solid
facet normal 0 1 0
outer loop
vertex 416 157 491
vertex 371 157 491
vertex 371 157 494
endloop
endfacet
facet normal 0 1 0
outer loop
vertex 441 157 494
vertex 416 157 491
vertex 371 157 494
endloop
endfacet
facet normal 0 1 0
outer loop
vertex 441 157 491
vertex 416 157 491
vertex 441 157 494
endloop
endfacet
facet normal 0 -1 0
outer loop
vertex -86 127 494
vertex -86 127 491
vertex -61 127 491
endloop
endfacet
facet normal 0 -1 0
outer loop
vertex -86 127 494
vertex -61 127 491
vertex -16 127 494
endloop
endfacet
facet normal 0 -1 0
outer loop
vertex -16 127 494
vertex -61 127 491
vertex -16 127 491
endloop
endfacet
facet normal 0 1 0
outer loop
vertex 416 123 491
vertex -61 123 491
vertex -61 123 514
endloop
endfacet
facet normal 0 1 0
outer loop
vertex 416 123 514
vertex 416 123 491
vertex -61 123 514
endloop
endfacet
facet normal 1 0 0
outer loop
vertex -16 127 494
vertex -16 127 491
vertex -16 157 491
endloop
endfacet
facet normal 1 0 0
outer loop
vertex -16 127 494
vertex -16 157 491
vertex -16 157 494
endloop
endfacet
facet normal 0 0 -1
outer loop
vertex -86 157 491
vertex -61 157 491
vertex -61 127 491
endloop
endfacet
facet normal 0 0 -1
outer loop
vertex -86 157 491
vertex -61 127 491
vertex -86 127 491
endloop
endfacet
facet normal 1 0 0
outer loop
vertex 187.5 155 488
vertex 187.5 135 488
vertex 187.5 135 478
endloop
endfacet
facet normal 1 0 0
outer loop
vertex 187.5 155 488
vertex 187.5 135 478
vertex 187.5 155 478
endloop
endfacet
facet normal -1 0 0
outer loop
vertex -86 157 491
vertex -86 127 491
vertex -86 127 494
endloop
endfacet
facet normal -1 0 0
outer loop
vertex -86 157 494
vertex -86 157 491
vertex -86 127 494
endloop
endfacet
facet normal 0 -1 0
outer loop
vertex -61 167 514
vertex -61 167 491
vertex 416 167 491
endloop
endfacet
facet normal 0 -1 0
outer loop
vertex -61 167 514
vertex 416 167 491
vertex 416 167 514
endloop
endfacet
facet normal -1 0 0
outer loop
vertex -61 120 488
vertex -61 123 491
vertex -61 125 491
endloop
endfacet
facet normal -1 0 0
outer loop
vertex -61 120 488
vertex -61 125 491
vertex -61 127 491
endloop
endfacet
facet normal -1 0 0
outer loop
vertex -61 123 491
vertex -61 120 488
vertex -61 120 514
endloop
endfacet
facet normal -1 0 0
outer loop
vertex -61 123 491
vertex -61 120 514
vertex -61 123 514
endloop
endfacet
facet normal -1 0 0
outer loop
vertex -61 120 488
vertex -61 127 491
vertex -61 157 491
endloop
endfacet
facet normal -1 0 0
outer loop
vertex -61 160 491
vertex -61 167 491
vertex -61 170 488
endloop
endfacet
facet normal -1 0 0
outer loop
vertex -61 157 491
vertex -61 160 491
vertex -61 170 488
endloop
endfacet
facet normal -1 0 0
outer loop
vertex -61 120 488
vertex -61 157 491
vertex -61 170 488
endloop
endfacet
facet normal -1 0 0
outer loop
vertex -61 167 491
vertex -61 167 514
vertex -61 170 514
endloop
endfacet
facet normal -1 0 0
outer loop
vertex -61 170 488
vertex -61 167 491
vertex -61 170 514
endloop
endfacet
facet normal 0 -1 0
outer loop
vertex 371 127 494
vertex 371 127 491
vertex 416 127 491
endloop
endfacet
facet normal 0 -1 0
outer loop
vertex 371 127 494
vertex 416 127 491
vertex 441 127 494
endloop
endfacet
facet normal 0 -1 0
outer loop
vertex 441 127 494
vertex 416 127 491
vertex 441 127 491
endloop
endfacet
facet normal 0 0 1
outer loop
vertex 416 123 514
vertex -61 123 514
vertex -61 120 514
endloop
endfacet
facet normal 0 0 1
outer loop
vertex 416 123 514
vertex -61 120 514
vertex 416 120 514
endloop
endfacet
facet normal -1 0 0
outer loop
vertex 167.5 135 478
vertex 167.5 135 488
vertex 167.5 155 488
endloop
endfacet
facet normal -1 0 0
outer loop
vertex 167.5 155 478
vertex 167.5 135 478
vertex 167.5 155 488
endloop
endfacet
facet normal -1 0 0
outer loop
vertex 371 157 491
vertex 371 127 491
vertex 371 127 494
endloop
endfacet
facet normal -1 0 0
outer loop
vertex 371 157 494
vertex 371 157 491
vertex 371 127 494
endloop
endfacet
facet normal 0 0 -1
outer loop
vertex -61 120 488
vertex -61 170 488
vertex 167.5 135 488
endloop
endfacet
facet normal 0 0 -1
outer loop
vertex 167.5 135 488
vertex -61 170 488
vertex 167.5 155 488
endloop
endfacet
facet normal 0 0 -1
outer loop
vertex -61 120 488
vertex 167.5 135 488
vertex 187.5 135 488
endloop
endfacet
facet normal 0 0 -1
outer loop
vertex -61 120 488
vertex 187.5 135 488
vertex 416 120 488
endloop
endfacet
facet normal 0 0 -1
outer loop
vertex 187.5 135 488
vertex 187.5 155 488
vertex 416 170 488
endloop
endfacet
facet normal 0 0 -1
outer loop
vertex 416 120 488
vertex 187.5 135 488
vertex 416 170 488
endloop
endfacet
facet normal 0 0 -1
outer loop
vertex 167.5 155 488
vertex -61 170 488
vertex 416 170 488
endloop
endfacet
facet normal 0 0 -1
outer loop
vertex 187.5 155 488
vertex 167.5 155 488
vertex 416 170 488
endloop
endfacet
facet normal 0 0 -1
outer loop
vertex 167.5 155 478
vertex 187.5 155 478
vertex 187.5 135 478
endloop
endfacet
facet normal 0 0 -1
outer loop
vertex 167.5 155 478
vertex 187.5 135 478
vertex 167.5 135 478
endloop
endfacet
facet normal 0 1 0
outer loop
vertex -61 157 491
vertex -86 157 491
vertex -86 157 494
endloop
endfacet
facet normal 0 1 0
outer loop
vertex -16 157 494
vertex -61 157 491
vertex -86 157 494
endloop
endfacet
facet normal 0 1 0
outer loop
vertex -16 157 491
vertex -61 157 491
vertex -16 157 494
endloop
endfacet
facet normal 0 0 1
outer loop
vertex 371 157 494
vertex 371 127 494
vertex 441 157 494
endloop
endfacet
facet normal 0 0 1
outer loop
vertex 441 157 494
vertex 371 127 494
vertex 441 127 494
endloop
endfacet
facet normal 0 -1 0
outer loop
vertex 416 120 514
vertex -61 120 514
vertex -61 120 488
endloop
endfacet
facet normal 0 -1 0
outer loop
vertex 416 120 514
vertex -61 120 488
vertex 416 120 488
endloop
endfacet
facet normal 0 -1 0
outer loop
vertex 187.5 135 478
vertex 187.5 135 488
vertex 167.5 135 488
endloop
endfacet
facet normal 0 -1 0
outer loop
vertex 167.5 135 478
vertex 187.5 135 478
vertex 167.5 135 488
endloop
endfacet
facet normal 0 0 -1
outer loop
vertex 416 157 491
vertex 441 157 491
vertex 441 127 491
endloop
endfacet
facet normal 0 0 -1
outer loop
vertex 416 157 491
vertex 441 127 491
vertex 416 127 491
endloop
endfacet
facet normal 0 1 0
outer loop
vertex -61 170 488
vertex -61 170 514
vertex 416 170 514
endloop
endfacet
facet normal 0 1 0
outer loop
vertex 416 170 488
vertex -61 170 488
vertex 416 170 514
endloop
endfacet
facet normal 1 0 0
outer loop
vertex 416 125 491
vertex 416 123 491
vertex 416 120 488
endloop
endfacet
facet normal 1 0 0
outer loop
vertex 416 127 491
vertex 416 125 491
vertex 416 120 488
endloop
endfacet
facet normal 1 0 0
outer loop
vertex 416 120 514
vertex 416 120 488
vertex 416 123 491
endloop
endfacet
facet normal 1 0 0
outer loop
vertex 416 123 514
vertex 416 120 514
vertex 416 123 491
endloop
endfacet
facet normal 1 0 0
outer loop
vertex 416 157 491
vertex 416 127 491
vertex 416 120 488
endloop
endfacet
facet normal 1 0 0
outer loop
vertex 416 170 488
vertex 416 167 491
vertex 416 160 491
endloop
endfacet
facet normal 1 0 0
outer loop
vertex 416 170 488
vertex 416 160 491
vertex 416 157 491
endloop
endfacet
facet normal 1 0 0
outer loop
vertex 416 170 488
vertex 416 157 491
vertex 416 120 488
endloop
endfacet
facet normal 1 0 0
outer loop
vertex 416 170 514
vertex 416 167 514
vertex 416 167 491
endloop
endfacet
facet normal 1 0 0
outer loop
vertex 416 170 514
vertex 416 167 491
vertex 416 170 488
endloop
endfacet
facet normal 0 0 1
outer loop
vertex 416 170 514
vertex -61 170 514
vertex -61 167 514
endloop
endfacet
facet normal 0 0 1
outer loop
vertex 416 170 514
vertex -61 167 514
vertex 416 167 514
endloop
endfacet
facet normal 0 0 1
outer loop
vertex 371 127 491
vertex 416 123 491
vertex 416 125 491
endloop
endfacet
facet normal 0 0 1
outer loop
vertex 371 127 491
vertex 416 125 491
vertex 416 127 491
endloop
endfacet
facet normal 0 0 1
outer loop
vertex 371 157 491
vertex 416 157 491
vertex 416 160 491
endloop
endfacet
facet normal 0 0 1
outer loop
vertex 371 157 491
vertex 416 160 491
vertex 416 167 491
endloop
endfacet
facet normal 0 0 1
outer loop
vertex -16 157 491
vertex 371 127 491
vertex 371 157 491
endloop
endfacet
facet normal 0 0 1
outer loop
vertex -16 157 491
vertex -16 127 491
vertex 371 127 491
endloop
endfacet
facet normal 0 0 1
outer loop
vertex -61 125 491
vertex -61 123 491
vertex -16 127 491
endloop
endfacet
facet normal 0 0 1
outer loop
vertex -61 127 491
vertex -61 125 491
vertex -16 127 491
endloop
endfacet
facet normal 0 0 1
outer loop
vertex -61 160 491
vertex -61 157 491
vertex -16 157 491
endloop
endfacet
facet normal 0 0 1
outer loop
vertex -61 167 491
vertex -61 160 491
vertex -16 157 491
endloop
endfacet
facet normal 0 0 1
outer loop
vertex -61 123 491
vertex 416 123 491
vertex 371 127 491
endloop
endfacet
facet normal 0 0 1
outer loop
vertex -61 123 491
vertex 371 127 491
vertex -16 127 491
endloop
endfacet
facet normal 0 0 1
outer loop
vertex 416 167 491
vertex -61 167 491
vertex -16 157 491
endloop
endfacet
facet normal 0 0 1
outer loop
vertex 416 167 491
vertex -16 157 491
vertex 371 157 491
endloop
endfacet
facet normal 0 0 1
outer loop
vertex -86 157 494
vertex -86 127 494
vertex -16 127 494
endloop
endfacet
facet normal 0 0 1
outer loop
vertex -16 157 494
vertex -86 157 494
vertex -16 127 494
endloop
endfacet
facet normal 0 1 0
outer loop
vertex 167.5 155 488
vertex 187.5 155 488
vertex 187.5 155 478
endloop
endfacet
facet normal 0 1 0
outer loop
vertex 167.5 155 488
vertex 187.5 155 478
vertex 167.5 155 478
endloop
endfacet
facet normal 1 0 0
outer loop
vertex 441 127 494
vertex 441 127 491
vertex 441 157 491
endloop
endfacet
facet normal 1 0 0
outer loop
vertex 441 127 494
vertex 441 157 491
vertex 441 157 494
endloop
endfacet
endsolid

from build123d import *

# Parameters (mm, degrees)
SKETCH1_W           = 477.000009268
SKETCH1_H           = 50.00000447
BOSS_EXTRUDE1_DEPTH = 25.999993086
SKETCH2_W           = 23.000001907
SKETCH2_H           = 43.999992311
CUT_EXTRUDE1_DEPTH  = 722.543490013
SKETCH3_W           = 99.999994039
SKETCH3_H           = 30.000001192
BOSS_EXTRUDE2_DEPTH = 2.999991179
SKETCH4_W           = 99.999995902
SKETCH4_H           = 30.000001192
BOSS_EXTRUDE3_DEPTH = 2.999991179
SKETCH5_W           = 19.999995828
SKETCH5_H           = 19.999995828
BOSS_EXTRUDE4_DEPTH = 10.000020266
MOVE_FACE8_BY       = 30
MOVE_FACE8_2_BY     = 30
MOVE_FACE9_BY       = 5
MOVE_FACE9_2_BY     = 5
MOVE_FACE10_BY      = 5
MOVE_FACE10_2_BY    = 5
MOVE_FACE11_BY      = 2
MOVE_FACE11_2_BY    = 2
MOVE_FACE12_BY      = 2
MOVE_FACE12_2_BY    = 2


with BuildPart() as part:
    # Sketch1 → Boss-Extrude1 (new body)
    with BuildSketch(Plane.XY.offset(513.999998569)):
        with Locations((177.500003949, 144.999999553)):
            Rectangle(SKETCH1_W, SKETCH1_H)
    extrude(amount=-BOSS_EXTRUDE1_DEPTH)

    # Sketch2 → Cut-Extrude1 (cut, through all)
    with BuildSketch(Plane.ZY.offset(61.000000685)):
        with Locations((502.499997616, 144.999999553)):
            Rectangle(SKETCH2_W, SKETCH2_H)
    extrude(amount=-CUT_EXTRUDE1_DEPTH, mode=Mode.SUBTRACT)

    # Sketch3 → Boss-Extrude2 (add)
    with BuildSketch(Plane.XY.offset(490.999996662)):
        with Locations((420.999988914, 144.999995828)):
            Rectangle(SKETCH3_W, SKETCH3_H)
    extrude(amount=BOSS_EXTRUDE2_DEPTH)

    # Sketch4 → Boss-Extrude3 (add)
    with BuildSketch(Plane.XY.offset(490.999996662)):
        with Locations((-65.999998711, 144.999995828)):
            Rectangle(SKETCH4_W, SKETCH4_H)
    extrude(amount=BOSS_EXTRUDE3_DEPTH)

    # Sketch5 → Boss-Extrude4 (add)
    with BuildSketch(Plane(origin=(0, 0, 488.000005484), x_dir=(-1, 0, 0), z_dir=(0, 0, -1))):
        with Locations((-177.500002086, 145.000003278)):
            Rectangle(SKETCH5_W, SKETCH5_H)
    extrude(amount=BOSS_EXTRUDE4_DEPTH)

    # Move Face8: a face moved inward by 30.0
    extrude(part.faces().sort_by_distance((-115.999996662, 144.999995828, 492.499992251))[0], amount=MOVE_FACE8_BY, dir=(1, 0, 0), mode=Mode.SUBTRACT)

    # Move Face8 2: a face moved inward by 30.0
    extrude(part.faces().sort_by_distance((470.999985933, 144.999995828, 492.499992251))[0], amount=MOVE_FACE8_2_BY, dir=(-1, 0, 0), mode=Mode.SUBTRACT)

    # Move Face9: a face moved outward by 5.0
    extrude(part.faces().sort_by_distance((405.999988914, 129.999995232, 492.499992251))[0], amount=MOVE_FACE9_BY, dir=(0, -1, 0))

    # Move Face9 2: a face moved outward by 5.0
    extrude(part.faces().sort_by_distance((-50.999998711, 129.999995232, 492.499992251))[0], amount=MOVE_FACE9_2_BY, dir=(0, -1, 0))

    # Move Face10: a face moved inward by 5.0
    extrude(part.faces().sort_by_distance((-50.999998711, 159.999996424, 492.499992251))[0], amount=MOVE_FACE10_BY, dir=(0, -1, 0), mode=Mode.SUBTRACT)

    # Move Face10 2: a face moved inward by 5.0
    extrude(part.faces().sort_by_distance((405.999988914, 159.999996424, 492.499992251))[0], amount=MOVE_FACE10_2_BY, dir=(0, -1, 0), mode=Mode.SUBTRACT)

    # Move Face11: a face moved outward by 2.0
    extrude(part.faces().sort_by_distance((-50.999998711, 154.999996424, 492.499992251))[0], amount=MOVE_FACE11_BY, dir=(0, 1, 0))

    # Move Face11 2: a face moved outward by 2.0
    extrude(part.faces().sort_by_distance((405.999988914, 154.999996424, 492.499992251))[0], amount=MOVE_FACE11_2_BY, dir=(0, 1, 0))

    # Move Face12: a face moved inward by 2.0
    extrude(part.faces().sort_by_distance((405.999988914, 124.999995232, 492.499992251))[0], amount=MOVE_FACE12_BY, dir=(0, 1, 0), mode=Mode.SUBTRACT)

    # Move Face12 2: a face moved inward by 2.0
    extrude(part.faces().sort_by_distance((-50.999998711, 124.999995232, 492.499992251))[0], amount=MOVE_FACE12_2_BY, dir=(0, 1, 0), mode=Mode.SUBTRACT)


solid = part.part
